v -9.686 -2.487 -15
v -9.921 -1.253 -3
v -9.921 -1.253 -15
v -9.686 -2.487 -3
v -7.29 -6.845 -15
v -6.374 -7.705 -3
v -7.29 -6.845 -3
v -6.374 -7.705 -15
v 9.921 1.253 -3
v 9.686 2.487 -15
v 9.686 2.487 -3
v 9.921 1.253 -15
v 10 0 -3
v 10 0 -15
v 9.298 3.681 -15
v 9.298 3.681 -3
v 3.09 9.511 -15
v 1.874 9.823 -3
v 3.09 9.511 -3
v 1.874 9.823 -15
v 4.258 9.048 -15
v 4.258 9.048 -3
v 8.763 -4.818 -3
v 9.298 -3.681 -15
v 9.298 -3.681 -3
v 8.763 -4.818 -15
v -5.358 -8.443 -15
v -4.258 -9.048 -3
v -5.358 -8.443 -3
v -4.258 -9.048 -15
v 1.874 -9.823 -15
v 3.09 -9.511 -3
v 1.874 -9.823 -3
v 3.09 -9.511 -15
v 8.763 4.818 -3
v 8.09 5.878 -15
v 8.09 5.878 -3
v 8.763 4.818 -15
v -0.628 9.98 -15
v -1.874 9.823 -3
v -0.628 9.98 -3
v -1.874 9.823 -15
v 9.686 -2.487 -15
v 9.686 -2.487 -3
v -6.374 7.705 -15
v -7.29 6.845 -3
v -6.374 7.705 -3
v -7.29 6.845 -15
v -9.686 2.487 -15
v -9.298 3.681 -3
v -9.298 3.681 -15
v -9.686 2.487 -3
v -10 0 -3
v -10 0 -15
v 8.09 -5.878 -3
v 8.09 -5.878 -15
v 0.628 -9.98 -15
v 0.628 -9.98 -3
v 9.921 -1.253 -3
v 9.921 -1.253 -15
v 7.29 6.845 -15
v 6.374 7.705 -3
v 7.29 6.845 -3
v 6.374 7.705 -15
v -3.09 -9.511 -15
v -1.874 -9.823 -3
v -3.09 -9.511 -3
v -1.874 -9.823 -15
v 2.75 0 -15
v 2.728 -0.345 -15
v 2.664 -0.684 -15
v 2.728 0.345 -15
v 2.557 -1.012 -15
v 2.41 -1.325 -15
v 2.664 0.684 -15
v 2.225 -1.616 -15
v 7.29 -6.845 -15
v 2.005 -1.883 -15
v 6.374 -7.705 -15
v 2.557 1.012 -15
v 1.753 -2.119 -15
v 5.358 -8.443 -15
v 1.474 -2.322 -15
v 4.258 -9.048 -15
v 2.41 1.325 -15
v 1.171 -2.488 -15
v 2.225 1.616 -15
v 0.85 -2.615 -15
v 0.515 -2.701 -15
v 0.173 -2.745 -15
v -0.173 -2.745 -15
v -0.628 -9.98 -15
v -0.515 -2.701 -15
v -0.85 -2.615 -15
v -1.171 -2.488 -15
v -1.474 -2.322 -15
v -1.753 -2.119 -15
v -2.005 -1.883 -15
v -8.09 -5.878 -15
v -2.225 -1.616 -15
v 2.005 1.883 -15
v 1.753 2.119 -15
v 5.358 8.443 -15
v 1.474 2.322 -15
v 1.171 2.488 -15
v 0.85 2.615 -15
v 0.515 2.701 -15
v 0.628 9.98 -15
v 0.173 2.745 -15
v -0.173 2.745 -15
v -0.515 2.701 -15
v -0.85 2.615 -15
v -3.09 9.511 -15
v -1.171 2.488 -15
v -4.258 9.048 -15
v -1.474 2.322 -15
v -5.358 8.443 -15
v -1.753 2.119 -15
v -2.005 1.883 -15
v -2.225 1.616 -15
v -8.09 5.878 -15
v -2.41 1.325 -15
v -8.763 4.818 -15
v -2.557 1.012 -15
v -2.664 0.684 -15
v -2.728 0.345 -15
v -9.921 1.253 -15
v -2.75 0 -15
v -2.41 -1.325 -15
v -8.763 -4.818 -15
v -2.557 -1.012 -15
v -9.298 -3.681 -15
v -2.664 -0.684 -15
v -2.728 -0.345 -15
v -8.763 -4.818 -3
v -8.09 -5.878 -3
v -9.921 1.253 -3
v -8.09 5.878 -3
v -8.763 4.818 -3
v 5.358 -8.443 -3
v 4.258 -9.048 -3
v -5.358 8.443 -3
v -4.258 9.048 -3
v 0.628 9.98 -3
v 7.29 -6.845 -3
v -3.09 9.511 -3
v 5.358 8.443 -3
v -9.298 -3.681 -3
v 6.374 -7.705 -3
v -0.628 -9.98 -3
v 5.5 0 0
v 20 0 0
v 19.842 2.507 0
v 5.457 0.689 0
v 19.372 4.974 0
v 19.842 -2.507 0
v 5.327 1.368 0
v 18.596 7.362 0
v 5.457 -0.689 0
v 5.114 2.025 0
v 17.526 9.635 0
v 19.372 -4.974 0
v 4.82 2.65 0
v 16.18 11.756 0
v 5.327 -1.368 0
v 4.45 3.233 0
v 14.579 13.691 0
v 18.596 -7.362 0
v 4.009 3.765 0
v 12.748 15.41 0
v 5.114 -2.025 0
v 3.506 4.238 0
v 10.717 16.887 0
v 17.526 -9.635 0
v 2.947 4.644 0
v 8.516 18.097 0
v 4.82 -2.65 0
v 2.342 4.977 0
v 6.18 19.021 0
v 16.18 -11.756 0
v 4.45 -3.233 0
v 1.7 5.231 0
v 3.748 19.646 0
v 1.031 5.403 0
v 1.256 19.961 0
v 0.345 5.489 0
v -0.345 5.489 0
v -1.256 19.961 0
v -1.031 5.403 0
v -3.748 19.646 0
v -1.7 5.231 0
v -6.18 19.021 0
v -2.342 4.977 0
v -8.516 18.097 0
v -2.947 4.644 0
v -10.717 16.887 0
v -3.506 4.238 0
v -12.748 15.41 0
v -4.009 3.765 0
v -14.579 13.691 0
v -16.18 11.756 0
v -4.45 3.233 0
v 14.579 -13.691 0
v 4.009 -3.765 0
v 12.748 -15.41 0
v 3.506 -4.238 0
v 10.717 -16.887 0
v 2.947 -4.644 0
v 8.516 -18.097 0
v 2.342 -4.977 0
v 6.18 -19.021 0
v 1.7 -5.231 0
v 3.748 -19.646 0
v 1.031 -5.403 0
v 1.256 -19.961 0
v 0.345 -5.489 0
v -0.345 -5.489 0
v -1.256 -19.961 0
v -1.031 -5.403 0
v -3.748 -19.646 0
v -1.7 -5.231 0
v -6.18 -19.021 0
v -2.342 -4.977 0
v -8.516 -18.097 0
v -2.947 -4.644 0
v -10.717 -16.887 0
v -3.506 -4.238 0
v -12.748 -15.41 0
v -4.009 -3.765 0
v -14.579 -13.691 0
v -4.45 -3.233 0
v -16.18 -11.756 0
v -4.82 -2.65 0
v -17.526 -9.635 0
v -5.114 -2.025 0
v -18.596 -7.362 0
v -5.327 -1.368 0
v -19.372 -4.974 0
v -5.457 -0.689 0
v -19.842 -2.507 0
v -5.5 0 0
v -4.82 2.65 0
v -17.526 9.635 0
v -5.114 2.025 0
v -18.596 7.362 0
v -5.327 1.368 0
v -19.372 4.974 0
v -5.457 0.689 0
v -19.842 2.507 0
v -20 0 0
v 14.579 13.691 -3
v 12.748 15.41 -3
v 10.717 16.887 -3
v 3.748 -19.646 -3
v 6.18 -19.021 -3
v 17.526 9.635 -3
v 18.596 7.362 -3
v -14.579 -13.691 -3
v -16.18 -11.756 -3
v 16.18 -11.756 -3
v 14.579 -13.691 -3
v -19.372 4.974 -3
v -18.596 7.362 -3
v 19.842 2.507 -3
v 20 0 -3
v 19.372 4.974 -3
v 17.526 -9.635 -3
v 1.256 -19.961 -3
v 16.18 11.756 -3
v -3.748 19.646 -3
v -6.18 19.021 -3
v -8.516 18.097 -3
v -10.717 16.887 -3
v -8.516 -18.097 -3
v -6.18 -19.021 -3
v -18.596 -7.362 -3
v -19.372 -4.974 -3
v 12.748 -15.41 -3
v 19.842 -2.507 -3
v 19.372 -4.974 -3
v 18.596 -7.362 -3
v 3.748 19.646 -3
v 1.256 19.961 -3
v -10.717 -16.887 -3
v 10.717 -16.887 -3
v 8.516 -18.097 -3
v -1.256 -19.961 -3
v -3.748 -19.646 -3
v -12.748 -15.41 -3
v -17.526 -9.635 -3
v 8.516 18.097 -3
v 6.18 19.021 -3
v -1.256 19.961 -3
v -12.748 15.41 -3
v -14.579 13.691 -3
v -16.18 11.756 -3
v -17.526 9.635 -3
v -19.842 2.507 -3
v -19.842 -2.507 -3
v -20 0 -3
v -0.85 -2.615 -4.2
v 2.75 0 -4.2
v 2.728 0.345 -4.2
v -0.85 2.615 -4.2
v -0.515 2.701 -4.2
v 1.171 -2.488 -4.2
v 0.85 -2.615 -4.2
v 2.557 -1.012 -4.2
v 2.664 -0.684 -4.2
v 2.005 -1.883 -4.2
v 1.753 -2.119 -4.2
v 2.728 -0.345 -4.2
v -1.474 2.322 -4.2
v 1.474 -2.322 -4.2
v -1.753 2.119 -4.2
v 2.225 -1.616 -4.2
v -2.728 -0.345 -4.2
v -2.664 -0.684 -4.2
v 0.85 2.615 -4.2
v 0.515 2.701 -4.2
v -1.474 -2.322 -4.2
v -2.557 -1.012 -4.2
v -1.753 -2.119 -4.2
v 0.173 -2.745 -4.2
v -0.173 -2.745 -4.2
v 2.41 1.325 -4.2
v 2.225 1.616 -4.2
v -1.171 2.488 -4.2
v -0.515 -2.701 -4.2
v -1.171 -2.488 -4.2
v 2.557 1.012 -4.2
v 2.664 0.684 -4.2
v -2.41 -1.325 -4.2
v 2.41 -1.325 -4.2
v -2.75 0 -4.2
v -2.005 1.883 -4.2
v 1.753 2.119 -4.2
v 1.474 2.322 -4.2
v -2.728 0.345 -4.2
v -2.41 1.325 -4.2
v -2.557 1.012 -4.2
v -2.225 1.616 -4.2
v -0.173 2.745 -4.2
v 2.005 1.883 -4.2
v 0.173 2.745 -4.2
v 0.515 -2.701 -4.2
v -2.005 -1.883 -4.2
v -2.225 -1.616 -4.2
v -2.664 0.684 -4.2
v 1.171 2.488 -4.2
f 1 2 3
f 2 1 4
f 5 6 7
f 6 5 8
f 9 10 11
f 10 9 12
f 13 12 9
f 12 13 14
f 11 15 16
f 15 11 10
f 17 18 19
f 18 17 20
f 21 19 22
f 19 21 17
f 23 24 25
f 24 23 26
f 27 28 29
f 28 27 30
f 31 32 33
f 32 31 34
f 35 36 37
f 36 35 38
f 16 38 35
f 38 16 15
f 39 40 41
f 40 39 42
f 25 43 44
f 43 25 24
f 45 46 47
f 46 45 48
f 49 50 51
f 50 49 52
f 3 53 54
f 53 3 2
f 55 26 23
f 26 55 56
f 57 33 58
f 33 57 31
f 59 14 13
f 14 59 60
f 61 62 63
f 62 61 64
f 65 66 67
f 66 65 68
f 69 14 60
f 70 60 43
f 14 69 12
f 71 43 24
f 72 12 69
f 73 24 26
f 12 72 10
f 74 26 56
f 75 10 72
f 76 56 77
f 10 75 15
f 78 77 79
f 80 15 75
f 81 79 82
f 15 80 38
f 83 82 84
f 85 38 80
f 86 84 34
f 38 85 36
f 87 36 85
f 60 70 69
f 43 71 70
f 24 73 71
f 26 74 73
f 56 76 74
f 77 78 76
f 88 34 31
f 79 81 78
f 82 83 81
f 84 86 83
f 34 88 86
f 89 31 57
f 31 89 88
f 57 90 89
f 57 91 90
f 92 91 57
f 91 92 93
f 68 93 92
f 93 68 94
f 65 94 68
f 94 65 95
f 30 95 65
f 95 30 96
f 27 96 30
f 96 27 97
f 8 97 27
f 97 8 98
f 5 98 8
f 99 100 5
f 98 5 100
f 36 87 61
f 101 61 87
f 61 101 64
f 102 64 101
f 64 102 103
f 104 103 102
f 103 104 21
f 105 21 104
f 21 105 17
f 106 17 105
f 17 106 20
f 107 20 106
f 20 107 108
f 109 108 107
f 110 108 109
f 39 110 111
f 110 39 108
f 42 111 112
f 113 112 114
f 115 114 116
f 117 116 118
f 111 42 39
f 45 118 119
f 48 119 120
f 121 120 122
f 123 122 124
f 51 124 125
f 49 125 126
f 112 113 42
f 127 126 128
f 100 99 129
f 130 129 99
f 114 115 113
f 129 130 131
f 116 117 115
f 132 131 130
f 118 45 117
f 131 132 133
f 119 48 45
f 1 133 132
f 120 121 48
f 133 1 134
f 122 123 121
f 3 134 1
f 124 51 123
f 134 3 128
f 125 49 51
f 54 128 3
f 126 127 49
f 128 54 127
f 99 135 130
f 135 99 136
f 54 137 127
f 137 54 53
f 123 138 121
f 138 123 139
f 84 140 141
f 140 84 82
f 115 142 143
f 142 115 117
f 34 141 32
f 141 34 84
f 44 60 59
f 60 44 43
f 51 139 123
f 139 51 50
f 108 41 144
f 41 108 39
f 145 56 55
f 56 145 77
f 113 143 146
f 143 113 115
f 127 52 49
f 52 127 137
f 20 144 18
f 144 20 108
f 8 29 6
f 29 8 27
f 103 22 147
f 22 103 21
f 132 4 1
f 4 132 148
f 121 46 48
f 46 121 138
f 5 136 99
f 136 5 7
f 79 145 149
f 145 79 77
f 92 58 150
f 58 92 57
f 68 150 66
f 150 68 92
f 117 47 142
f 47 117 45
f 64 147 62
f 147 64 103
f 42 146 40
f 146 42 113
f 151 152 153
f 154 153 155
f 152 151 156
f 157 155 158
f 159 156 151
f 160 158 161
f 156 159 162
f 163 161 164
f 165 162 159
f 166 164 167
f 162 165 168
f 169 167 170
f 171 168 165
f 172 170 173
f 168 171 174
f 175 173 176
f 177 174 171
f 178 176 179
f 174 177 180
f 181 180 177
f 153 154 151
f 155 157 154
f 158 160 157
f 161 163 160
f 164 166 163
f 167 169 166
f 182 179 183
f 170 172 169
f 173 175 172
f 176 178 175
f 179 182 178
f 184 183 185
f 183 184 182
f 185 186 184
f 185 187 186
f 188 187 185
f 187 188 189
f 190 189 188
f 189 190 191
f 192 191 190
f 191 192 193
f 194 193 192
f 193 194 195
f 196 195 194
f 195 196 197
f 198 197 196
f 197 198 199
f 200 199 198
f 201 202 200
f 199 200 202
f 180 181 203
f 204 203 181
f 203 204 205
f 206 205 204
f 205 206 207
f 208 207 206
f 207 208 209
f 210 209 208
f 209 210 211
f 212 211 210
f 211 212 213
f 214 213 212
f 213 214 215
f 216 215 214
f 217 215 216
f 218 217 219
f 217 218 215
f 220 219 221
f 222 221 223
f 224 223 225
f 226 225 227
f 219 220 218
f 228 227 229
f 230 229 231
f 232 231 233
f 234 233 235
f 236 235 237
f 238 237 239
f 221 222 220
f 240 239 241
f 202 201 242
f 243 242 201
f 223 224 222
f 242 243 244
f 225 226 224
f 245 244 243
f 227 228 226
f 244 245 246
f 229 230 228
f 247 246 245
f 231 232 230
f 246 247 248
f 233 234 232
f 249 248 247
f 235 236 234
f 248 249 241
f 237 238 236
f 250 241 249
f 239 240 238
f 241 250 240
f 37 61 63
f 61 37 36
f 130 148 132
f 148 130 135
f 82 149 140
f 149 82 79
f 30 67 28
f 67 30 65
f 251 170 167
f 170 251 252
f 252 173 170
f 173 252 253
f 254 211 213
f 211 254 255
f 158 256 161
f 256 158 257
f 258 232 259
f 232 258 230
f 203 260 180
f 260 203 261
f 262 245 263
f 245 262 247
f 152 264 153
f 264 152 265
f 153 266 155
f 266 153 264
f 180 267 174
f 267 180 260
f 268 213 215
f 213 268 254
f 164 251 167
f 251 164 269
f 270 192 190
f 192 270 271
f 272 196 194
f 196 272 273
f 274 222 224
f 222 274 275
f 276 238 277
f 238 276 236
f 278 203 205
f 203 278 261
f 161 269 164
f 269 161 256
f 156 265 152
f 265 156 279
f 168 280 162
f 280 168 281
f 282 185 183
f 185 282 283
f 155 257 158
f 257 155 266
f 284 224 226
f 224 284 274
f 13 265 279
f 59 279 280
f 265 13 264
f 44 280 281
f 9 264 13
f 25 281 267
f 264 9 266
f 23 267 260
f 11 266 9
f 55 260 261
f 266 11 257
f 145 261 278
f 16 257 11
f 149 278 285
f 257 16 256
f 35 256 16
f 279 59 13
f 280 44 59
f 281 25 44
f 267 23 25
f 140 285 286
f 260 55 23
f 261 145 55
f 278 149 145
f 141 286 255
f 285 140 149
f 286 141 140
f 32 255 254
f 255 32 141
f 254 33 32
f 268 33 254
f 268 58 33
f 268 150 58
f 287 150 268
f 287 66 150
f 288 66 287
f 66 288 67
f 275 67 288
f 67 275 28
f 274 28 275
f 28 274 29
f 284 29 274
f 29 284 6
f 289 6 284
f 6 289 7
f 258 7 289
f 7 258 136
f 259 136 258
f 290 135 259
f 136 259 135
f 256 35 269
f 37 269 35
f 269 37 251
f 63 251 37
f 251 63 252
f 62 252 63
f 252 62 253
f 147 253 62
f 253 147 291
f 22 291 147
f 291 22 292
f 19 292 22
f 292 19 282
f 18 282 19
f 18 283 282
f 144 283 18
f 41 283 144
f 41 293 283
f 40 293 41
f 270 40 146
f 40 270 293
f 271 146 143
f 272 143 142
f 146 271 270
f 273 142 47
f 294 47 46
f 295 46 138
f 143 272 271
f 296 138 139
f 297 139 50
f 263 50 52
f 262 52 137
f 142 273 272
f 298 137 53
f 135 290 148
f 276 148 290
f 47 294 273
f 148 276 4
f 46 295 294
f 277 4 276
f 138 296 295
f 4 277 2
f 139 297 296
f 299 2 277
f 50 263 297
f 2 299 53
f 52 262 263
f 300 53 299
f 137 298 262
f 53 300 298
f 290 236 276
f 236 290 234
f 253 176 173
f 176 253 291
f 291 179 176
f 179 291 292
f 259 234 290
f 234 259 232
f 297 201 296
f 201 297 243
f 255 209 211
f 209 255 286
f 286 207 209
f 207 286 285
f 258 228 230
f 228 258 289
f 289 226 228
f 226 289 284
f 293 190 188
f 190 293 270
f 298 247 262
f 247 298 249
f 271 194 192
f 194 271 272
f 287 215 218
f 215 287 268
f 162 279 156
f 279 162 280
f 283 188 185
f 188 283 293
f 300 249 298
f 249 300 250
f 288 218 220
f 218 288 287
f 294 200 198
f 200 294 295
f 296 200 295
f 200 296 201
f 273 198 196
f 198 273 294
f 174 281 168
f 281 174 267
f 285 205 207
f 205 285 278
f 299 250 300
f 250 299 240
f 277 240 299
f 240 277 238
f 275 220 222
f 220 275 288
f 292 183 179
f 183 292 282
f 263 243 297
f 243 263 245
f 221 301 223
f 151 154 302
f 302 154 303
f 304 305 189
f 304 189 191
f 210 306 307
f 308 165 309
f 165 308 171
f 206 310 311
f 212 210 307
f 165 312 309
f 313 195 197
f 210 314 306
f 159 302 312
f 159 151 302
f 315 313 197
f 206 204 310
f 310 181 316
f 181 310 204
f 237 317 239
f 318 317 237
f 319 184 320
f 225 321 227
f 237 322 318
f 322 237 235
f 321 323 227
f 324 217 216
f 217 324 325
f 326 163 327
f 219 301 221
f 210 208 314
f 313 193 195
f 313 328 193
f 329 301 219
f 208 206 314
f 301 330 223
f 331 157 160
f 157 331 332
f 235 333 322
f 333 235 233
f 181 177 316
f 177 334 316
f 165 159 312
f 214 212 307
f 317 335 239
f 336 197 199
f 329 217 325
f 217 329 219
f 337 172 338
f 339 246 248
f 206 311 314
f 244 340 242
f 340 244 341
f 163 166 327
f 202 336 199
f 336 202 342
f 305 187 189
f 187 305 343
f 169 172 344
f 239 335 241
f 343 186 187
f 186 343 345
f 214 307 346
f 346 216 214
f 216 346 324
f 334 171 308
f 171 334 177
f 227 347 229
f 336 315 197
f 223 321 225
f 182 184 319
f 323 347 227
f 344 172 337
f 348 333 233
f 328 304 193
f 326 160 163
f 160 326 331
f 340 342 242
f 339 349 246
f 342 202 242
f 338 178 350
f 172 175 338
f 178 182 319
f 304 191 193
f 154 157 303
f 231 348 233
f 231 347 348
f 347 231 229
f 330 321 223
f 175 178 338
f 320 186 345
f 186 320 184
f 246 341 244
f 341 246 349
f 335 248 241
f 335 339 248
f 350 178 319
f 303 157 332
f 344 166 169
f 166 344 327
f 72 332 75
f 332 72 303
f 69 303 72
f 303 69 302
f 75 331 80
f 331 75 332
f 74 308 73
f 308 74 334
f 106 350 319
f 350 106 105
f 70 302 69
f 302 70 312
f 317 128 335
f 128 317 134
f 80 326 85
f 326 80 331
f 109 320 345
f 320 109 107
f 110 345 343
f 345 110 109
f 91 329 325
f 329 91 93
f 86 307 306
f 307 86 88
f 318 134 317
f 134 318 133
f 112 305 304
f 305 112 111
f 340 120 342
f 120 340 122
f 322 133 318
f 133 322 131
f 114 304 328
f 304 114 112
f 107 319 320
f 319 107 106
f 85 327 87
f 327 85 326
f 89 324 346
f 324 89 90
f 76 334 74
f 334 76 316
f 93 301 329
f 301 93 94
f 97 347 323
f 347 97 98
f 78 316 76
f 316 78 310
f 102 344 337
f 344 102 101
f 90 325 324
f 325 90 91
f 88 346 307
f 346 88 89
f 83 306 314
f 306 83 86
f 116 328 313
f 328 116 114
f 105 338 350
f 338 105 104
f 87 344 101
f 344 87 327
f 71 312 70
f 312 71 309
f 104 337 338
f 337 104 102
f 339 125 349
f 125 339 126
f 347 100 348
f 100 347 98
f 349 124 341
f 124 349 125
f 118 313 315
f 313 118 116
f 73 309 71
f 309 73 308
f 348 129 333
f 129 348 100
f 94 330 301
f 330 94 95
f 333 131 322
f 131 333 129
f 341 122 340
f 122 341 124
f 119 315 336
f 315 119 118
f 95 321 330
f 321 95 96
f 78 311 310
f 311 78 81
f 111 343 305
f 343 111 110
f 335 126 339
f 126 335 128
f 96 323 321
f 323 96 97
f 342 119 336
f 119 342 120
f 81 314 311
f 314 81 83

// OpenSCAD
$fn = 50;


difference() {
	union() {
		translate(v = [0, 0, -15.0000000000]) {
			cylinder(h = 15, r = 10.0000000000);
		}
		translate(v = [0, 0, -3.0000000000]) {
			cylinder(h = 3, r = 20.0000000000);
		}
	}
	union() {
		translate(v = [0, 0, 0]) {
			rotate(a = [0, 0, 0]) {
				difference() {
					union() {
						#translate(v = [0, 0, -15.0000000000]) {
							cylinder(h = 15, r = 2.2500000000);
						}
						#translate(v = [0, 0, -4.2000000000]) {
							cylinder(h = 4.2000000000, r = 10.0000000000, r1 = 2.7500000000, r2 = 5.5000000000);
						}
						#translate(v = [0, 0, -15.0000000000]) {
							cylinder(h = 15, r = 2.7500000000);
						}
						#translate(v = [0, 0, -15.0000000000]) {
							cylinder(h = 15, r = 2.2500000000);
						}
					}
					union();
				}
			}
		}
	}
}
